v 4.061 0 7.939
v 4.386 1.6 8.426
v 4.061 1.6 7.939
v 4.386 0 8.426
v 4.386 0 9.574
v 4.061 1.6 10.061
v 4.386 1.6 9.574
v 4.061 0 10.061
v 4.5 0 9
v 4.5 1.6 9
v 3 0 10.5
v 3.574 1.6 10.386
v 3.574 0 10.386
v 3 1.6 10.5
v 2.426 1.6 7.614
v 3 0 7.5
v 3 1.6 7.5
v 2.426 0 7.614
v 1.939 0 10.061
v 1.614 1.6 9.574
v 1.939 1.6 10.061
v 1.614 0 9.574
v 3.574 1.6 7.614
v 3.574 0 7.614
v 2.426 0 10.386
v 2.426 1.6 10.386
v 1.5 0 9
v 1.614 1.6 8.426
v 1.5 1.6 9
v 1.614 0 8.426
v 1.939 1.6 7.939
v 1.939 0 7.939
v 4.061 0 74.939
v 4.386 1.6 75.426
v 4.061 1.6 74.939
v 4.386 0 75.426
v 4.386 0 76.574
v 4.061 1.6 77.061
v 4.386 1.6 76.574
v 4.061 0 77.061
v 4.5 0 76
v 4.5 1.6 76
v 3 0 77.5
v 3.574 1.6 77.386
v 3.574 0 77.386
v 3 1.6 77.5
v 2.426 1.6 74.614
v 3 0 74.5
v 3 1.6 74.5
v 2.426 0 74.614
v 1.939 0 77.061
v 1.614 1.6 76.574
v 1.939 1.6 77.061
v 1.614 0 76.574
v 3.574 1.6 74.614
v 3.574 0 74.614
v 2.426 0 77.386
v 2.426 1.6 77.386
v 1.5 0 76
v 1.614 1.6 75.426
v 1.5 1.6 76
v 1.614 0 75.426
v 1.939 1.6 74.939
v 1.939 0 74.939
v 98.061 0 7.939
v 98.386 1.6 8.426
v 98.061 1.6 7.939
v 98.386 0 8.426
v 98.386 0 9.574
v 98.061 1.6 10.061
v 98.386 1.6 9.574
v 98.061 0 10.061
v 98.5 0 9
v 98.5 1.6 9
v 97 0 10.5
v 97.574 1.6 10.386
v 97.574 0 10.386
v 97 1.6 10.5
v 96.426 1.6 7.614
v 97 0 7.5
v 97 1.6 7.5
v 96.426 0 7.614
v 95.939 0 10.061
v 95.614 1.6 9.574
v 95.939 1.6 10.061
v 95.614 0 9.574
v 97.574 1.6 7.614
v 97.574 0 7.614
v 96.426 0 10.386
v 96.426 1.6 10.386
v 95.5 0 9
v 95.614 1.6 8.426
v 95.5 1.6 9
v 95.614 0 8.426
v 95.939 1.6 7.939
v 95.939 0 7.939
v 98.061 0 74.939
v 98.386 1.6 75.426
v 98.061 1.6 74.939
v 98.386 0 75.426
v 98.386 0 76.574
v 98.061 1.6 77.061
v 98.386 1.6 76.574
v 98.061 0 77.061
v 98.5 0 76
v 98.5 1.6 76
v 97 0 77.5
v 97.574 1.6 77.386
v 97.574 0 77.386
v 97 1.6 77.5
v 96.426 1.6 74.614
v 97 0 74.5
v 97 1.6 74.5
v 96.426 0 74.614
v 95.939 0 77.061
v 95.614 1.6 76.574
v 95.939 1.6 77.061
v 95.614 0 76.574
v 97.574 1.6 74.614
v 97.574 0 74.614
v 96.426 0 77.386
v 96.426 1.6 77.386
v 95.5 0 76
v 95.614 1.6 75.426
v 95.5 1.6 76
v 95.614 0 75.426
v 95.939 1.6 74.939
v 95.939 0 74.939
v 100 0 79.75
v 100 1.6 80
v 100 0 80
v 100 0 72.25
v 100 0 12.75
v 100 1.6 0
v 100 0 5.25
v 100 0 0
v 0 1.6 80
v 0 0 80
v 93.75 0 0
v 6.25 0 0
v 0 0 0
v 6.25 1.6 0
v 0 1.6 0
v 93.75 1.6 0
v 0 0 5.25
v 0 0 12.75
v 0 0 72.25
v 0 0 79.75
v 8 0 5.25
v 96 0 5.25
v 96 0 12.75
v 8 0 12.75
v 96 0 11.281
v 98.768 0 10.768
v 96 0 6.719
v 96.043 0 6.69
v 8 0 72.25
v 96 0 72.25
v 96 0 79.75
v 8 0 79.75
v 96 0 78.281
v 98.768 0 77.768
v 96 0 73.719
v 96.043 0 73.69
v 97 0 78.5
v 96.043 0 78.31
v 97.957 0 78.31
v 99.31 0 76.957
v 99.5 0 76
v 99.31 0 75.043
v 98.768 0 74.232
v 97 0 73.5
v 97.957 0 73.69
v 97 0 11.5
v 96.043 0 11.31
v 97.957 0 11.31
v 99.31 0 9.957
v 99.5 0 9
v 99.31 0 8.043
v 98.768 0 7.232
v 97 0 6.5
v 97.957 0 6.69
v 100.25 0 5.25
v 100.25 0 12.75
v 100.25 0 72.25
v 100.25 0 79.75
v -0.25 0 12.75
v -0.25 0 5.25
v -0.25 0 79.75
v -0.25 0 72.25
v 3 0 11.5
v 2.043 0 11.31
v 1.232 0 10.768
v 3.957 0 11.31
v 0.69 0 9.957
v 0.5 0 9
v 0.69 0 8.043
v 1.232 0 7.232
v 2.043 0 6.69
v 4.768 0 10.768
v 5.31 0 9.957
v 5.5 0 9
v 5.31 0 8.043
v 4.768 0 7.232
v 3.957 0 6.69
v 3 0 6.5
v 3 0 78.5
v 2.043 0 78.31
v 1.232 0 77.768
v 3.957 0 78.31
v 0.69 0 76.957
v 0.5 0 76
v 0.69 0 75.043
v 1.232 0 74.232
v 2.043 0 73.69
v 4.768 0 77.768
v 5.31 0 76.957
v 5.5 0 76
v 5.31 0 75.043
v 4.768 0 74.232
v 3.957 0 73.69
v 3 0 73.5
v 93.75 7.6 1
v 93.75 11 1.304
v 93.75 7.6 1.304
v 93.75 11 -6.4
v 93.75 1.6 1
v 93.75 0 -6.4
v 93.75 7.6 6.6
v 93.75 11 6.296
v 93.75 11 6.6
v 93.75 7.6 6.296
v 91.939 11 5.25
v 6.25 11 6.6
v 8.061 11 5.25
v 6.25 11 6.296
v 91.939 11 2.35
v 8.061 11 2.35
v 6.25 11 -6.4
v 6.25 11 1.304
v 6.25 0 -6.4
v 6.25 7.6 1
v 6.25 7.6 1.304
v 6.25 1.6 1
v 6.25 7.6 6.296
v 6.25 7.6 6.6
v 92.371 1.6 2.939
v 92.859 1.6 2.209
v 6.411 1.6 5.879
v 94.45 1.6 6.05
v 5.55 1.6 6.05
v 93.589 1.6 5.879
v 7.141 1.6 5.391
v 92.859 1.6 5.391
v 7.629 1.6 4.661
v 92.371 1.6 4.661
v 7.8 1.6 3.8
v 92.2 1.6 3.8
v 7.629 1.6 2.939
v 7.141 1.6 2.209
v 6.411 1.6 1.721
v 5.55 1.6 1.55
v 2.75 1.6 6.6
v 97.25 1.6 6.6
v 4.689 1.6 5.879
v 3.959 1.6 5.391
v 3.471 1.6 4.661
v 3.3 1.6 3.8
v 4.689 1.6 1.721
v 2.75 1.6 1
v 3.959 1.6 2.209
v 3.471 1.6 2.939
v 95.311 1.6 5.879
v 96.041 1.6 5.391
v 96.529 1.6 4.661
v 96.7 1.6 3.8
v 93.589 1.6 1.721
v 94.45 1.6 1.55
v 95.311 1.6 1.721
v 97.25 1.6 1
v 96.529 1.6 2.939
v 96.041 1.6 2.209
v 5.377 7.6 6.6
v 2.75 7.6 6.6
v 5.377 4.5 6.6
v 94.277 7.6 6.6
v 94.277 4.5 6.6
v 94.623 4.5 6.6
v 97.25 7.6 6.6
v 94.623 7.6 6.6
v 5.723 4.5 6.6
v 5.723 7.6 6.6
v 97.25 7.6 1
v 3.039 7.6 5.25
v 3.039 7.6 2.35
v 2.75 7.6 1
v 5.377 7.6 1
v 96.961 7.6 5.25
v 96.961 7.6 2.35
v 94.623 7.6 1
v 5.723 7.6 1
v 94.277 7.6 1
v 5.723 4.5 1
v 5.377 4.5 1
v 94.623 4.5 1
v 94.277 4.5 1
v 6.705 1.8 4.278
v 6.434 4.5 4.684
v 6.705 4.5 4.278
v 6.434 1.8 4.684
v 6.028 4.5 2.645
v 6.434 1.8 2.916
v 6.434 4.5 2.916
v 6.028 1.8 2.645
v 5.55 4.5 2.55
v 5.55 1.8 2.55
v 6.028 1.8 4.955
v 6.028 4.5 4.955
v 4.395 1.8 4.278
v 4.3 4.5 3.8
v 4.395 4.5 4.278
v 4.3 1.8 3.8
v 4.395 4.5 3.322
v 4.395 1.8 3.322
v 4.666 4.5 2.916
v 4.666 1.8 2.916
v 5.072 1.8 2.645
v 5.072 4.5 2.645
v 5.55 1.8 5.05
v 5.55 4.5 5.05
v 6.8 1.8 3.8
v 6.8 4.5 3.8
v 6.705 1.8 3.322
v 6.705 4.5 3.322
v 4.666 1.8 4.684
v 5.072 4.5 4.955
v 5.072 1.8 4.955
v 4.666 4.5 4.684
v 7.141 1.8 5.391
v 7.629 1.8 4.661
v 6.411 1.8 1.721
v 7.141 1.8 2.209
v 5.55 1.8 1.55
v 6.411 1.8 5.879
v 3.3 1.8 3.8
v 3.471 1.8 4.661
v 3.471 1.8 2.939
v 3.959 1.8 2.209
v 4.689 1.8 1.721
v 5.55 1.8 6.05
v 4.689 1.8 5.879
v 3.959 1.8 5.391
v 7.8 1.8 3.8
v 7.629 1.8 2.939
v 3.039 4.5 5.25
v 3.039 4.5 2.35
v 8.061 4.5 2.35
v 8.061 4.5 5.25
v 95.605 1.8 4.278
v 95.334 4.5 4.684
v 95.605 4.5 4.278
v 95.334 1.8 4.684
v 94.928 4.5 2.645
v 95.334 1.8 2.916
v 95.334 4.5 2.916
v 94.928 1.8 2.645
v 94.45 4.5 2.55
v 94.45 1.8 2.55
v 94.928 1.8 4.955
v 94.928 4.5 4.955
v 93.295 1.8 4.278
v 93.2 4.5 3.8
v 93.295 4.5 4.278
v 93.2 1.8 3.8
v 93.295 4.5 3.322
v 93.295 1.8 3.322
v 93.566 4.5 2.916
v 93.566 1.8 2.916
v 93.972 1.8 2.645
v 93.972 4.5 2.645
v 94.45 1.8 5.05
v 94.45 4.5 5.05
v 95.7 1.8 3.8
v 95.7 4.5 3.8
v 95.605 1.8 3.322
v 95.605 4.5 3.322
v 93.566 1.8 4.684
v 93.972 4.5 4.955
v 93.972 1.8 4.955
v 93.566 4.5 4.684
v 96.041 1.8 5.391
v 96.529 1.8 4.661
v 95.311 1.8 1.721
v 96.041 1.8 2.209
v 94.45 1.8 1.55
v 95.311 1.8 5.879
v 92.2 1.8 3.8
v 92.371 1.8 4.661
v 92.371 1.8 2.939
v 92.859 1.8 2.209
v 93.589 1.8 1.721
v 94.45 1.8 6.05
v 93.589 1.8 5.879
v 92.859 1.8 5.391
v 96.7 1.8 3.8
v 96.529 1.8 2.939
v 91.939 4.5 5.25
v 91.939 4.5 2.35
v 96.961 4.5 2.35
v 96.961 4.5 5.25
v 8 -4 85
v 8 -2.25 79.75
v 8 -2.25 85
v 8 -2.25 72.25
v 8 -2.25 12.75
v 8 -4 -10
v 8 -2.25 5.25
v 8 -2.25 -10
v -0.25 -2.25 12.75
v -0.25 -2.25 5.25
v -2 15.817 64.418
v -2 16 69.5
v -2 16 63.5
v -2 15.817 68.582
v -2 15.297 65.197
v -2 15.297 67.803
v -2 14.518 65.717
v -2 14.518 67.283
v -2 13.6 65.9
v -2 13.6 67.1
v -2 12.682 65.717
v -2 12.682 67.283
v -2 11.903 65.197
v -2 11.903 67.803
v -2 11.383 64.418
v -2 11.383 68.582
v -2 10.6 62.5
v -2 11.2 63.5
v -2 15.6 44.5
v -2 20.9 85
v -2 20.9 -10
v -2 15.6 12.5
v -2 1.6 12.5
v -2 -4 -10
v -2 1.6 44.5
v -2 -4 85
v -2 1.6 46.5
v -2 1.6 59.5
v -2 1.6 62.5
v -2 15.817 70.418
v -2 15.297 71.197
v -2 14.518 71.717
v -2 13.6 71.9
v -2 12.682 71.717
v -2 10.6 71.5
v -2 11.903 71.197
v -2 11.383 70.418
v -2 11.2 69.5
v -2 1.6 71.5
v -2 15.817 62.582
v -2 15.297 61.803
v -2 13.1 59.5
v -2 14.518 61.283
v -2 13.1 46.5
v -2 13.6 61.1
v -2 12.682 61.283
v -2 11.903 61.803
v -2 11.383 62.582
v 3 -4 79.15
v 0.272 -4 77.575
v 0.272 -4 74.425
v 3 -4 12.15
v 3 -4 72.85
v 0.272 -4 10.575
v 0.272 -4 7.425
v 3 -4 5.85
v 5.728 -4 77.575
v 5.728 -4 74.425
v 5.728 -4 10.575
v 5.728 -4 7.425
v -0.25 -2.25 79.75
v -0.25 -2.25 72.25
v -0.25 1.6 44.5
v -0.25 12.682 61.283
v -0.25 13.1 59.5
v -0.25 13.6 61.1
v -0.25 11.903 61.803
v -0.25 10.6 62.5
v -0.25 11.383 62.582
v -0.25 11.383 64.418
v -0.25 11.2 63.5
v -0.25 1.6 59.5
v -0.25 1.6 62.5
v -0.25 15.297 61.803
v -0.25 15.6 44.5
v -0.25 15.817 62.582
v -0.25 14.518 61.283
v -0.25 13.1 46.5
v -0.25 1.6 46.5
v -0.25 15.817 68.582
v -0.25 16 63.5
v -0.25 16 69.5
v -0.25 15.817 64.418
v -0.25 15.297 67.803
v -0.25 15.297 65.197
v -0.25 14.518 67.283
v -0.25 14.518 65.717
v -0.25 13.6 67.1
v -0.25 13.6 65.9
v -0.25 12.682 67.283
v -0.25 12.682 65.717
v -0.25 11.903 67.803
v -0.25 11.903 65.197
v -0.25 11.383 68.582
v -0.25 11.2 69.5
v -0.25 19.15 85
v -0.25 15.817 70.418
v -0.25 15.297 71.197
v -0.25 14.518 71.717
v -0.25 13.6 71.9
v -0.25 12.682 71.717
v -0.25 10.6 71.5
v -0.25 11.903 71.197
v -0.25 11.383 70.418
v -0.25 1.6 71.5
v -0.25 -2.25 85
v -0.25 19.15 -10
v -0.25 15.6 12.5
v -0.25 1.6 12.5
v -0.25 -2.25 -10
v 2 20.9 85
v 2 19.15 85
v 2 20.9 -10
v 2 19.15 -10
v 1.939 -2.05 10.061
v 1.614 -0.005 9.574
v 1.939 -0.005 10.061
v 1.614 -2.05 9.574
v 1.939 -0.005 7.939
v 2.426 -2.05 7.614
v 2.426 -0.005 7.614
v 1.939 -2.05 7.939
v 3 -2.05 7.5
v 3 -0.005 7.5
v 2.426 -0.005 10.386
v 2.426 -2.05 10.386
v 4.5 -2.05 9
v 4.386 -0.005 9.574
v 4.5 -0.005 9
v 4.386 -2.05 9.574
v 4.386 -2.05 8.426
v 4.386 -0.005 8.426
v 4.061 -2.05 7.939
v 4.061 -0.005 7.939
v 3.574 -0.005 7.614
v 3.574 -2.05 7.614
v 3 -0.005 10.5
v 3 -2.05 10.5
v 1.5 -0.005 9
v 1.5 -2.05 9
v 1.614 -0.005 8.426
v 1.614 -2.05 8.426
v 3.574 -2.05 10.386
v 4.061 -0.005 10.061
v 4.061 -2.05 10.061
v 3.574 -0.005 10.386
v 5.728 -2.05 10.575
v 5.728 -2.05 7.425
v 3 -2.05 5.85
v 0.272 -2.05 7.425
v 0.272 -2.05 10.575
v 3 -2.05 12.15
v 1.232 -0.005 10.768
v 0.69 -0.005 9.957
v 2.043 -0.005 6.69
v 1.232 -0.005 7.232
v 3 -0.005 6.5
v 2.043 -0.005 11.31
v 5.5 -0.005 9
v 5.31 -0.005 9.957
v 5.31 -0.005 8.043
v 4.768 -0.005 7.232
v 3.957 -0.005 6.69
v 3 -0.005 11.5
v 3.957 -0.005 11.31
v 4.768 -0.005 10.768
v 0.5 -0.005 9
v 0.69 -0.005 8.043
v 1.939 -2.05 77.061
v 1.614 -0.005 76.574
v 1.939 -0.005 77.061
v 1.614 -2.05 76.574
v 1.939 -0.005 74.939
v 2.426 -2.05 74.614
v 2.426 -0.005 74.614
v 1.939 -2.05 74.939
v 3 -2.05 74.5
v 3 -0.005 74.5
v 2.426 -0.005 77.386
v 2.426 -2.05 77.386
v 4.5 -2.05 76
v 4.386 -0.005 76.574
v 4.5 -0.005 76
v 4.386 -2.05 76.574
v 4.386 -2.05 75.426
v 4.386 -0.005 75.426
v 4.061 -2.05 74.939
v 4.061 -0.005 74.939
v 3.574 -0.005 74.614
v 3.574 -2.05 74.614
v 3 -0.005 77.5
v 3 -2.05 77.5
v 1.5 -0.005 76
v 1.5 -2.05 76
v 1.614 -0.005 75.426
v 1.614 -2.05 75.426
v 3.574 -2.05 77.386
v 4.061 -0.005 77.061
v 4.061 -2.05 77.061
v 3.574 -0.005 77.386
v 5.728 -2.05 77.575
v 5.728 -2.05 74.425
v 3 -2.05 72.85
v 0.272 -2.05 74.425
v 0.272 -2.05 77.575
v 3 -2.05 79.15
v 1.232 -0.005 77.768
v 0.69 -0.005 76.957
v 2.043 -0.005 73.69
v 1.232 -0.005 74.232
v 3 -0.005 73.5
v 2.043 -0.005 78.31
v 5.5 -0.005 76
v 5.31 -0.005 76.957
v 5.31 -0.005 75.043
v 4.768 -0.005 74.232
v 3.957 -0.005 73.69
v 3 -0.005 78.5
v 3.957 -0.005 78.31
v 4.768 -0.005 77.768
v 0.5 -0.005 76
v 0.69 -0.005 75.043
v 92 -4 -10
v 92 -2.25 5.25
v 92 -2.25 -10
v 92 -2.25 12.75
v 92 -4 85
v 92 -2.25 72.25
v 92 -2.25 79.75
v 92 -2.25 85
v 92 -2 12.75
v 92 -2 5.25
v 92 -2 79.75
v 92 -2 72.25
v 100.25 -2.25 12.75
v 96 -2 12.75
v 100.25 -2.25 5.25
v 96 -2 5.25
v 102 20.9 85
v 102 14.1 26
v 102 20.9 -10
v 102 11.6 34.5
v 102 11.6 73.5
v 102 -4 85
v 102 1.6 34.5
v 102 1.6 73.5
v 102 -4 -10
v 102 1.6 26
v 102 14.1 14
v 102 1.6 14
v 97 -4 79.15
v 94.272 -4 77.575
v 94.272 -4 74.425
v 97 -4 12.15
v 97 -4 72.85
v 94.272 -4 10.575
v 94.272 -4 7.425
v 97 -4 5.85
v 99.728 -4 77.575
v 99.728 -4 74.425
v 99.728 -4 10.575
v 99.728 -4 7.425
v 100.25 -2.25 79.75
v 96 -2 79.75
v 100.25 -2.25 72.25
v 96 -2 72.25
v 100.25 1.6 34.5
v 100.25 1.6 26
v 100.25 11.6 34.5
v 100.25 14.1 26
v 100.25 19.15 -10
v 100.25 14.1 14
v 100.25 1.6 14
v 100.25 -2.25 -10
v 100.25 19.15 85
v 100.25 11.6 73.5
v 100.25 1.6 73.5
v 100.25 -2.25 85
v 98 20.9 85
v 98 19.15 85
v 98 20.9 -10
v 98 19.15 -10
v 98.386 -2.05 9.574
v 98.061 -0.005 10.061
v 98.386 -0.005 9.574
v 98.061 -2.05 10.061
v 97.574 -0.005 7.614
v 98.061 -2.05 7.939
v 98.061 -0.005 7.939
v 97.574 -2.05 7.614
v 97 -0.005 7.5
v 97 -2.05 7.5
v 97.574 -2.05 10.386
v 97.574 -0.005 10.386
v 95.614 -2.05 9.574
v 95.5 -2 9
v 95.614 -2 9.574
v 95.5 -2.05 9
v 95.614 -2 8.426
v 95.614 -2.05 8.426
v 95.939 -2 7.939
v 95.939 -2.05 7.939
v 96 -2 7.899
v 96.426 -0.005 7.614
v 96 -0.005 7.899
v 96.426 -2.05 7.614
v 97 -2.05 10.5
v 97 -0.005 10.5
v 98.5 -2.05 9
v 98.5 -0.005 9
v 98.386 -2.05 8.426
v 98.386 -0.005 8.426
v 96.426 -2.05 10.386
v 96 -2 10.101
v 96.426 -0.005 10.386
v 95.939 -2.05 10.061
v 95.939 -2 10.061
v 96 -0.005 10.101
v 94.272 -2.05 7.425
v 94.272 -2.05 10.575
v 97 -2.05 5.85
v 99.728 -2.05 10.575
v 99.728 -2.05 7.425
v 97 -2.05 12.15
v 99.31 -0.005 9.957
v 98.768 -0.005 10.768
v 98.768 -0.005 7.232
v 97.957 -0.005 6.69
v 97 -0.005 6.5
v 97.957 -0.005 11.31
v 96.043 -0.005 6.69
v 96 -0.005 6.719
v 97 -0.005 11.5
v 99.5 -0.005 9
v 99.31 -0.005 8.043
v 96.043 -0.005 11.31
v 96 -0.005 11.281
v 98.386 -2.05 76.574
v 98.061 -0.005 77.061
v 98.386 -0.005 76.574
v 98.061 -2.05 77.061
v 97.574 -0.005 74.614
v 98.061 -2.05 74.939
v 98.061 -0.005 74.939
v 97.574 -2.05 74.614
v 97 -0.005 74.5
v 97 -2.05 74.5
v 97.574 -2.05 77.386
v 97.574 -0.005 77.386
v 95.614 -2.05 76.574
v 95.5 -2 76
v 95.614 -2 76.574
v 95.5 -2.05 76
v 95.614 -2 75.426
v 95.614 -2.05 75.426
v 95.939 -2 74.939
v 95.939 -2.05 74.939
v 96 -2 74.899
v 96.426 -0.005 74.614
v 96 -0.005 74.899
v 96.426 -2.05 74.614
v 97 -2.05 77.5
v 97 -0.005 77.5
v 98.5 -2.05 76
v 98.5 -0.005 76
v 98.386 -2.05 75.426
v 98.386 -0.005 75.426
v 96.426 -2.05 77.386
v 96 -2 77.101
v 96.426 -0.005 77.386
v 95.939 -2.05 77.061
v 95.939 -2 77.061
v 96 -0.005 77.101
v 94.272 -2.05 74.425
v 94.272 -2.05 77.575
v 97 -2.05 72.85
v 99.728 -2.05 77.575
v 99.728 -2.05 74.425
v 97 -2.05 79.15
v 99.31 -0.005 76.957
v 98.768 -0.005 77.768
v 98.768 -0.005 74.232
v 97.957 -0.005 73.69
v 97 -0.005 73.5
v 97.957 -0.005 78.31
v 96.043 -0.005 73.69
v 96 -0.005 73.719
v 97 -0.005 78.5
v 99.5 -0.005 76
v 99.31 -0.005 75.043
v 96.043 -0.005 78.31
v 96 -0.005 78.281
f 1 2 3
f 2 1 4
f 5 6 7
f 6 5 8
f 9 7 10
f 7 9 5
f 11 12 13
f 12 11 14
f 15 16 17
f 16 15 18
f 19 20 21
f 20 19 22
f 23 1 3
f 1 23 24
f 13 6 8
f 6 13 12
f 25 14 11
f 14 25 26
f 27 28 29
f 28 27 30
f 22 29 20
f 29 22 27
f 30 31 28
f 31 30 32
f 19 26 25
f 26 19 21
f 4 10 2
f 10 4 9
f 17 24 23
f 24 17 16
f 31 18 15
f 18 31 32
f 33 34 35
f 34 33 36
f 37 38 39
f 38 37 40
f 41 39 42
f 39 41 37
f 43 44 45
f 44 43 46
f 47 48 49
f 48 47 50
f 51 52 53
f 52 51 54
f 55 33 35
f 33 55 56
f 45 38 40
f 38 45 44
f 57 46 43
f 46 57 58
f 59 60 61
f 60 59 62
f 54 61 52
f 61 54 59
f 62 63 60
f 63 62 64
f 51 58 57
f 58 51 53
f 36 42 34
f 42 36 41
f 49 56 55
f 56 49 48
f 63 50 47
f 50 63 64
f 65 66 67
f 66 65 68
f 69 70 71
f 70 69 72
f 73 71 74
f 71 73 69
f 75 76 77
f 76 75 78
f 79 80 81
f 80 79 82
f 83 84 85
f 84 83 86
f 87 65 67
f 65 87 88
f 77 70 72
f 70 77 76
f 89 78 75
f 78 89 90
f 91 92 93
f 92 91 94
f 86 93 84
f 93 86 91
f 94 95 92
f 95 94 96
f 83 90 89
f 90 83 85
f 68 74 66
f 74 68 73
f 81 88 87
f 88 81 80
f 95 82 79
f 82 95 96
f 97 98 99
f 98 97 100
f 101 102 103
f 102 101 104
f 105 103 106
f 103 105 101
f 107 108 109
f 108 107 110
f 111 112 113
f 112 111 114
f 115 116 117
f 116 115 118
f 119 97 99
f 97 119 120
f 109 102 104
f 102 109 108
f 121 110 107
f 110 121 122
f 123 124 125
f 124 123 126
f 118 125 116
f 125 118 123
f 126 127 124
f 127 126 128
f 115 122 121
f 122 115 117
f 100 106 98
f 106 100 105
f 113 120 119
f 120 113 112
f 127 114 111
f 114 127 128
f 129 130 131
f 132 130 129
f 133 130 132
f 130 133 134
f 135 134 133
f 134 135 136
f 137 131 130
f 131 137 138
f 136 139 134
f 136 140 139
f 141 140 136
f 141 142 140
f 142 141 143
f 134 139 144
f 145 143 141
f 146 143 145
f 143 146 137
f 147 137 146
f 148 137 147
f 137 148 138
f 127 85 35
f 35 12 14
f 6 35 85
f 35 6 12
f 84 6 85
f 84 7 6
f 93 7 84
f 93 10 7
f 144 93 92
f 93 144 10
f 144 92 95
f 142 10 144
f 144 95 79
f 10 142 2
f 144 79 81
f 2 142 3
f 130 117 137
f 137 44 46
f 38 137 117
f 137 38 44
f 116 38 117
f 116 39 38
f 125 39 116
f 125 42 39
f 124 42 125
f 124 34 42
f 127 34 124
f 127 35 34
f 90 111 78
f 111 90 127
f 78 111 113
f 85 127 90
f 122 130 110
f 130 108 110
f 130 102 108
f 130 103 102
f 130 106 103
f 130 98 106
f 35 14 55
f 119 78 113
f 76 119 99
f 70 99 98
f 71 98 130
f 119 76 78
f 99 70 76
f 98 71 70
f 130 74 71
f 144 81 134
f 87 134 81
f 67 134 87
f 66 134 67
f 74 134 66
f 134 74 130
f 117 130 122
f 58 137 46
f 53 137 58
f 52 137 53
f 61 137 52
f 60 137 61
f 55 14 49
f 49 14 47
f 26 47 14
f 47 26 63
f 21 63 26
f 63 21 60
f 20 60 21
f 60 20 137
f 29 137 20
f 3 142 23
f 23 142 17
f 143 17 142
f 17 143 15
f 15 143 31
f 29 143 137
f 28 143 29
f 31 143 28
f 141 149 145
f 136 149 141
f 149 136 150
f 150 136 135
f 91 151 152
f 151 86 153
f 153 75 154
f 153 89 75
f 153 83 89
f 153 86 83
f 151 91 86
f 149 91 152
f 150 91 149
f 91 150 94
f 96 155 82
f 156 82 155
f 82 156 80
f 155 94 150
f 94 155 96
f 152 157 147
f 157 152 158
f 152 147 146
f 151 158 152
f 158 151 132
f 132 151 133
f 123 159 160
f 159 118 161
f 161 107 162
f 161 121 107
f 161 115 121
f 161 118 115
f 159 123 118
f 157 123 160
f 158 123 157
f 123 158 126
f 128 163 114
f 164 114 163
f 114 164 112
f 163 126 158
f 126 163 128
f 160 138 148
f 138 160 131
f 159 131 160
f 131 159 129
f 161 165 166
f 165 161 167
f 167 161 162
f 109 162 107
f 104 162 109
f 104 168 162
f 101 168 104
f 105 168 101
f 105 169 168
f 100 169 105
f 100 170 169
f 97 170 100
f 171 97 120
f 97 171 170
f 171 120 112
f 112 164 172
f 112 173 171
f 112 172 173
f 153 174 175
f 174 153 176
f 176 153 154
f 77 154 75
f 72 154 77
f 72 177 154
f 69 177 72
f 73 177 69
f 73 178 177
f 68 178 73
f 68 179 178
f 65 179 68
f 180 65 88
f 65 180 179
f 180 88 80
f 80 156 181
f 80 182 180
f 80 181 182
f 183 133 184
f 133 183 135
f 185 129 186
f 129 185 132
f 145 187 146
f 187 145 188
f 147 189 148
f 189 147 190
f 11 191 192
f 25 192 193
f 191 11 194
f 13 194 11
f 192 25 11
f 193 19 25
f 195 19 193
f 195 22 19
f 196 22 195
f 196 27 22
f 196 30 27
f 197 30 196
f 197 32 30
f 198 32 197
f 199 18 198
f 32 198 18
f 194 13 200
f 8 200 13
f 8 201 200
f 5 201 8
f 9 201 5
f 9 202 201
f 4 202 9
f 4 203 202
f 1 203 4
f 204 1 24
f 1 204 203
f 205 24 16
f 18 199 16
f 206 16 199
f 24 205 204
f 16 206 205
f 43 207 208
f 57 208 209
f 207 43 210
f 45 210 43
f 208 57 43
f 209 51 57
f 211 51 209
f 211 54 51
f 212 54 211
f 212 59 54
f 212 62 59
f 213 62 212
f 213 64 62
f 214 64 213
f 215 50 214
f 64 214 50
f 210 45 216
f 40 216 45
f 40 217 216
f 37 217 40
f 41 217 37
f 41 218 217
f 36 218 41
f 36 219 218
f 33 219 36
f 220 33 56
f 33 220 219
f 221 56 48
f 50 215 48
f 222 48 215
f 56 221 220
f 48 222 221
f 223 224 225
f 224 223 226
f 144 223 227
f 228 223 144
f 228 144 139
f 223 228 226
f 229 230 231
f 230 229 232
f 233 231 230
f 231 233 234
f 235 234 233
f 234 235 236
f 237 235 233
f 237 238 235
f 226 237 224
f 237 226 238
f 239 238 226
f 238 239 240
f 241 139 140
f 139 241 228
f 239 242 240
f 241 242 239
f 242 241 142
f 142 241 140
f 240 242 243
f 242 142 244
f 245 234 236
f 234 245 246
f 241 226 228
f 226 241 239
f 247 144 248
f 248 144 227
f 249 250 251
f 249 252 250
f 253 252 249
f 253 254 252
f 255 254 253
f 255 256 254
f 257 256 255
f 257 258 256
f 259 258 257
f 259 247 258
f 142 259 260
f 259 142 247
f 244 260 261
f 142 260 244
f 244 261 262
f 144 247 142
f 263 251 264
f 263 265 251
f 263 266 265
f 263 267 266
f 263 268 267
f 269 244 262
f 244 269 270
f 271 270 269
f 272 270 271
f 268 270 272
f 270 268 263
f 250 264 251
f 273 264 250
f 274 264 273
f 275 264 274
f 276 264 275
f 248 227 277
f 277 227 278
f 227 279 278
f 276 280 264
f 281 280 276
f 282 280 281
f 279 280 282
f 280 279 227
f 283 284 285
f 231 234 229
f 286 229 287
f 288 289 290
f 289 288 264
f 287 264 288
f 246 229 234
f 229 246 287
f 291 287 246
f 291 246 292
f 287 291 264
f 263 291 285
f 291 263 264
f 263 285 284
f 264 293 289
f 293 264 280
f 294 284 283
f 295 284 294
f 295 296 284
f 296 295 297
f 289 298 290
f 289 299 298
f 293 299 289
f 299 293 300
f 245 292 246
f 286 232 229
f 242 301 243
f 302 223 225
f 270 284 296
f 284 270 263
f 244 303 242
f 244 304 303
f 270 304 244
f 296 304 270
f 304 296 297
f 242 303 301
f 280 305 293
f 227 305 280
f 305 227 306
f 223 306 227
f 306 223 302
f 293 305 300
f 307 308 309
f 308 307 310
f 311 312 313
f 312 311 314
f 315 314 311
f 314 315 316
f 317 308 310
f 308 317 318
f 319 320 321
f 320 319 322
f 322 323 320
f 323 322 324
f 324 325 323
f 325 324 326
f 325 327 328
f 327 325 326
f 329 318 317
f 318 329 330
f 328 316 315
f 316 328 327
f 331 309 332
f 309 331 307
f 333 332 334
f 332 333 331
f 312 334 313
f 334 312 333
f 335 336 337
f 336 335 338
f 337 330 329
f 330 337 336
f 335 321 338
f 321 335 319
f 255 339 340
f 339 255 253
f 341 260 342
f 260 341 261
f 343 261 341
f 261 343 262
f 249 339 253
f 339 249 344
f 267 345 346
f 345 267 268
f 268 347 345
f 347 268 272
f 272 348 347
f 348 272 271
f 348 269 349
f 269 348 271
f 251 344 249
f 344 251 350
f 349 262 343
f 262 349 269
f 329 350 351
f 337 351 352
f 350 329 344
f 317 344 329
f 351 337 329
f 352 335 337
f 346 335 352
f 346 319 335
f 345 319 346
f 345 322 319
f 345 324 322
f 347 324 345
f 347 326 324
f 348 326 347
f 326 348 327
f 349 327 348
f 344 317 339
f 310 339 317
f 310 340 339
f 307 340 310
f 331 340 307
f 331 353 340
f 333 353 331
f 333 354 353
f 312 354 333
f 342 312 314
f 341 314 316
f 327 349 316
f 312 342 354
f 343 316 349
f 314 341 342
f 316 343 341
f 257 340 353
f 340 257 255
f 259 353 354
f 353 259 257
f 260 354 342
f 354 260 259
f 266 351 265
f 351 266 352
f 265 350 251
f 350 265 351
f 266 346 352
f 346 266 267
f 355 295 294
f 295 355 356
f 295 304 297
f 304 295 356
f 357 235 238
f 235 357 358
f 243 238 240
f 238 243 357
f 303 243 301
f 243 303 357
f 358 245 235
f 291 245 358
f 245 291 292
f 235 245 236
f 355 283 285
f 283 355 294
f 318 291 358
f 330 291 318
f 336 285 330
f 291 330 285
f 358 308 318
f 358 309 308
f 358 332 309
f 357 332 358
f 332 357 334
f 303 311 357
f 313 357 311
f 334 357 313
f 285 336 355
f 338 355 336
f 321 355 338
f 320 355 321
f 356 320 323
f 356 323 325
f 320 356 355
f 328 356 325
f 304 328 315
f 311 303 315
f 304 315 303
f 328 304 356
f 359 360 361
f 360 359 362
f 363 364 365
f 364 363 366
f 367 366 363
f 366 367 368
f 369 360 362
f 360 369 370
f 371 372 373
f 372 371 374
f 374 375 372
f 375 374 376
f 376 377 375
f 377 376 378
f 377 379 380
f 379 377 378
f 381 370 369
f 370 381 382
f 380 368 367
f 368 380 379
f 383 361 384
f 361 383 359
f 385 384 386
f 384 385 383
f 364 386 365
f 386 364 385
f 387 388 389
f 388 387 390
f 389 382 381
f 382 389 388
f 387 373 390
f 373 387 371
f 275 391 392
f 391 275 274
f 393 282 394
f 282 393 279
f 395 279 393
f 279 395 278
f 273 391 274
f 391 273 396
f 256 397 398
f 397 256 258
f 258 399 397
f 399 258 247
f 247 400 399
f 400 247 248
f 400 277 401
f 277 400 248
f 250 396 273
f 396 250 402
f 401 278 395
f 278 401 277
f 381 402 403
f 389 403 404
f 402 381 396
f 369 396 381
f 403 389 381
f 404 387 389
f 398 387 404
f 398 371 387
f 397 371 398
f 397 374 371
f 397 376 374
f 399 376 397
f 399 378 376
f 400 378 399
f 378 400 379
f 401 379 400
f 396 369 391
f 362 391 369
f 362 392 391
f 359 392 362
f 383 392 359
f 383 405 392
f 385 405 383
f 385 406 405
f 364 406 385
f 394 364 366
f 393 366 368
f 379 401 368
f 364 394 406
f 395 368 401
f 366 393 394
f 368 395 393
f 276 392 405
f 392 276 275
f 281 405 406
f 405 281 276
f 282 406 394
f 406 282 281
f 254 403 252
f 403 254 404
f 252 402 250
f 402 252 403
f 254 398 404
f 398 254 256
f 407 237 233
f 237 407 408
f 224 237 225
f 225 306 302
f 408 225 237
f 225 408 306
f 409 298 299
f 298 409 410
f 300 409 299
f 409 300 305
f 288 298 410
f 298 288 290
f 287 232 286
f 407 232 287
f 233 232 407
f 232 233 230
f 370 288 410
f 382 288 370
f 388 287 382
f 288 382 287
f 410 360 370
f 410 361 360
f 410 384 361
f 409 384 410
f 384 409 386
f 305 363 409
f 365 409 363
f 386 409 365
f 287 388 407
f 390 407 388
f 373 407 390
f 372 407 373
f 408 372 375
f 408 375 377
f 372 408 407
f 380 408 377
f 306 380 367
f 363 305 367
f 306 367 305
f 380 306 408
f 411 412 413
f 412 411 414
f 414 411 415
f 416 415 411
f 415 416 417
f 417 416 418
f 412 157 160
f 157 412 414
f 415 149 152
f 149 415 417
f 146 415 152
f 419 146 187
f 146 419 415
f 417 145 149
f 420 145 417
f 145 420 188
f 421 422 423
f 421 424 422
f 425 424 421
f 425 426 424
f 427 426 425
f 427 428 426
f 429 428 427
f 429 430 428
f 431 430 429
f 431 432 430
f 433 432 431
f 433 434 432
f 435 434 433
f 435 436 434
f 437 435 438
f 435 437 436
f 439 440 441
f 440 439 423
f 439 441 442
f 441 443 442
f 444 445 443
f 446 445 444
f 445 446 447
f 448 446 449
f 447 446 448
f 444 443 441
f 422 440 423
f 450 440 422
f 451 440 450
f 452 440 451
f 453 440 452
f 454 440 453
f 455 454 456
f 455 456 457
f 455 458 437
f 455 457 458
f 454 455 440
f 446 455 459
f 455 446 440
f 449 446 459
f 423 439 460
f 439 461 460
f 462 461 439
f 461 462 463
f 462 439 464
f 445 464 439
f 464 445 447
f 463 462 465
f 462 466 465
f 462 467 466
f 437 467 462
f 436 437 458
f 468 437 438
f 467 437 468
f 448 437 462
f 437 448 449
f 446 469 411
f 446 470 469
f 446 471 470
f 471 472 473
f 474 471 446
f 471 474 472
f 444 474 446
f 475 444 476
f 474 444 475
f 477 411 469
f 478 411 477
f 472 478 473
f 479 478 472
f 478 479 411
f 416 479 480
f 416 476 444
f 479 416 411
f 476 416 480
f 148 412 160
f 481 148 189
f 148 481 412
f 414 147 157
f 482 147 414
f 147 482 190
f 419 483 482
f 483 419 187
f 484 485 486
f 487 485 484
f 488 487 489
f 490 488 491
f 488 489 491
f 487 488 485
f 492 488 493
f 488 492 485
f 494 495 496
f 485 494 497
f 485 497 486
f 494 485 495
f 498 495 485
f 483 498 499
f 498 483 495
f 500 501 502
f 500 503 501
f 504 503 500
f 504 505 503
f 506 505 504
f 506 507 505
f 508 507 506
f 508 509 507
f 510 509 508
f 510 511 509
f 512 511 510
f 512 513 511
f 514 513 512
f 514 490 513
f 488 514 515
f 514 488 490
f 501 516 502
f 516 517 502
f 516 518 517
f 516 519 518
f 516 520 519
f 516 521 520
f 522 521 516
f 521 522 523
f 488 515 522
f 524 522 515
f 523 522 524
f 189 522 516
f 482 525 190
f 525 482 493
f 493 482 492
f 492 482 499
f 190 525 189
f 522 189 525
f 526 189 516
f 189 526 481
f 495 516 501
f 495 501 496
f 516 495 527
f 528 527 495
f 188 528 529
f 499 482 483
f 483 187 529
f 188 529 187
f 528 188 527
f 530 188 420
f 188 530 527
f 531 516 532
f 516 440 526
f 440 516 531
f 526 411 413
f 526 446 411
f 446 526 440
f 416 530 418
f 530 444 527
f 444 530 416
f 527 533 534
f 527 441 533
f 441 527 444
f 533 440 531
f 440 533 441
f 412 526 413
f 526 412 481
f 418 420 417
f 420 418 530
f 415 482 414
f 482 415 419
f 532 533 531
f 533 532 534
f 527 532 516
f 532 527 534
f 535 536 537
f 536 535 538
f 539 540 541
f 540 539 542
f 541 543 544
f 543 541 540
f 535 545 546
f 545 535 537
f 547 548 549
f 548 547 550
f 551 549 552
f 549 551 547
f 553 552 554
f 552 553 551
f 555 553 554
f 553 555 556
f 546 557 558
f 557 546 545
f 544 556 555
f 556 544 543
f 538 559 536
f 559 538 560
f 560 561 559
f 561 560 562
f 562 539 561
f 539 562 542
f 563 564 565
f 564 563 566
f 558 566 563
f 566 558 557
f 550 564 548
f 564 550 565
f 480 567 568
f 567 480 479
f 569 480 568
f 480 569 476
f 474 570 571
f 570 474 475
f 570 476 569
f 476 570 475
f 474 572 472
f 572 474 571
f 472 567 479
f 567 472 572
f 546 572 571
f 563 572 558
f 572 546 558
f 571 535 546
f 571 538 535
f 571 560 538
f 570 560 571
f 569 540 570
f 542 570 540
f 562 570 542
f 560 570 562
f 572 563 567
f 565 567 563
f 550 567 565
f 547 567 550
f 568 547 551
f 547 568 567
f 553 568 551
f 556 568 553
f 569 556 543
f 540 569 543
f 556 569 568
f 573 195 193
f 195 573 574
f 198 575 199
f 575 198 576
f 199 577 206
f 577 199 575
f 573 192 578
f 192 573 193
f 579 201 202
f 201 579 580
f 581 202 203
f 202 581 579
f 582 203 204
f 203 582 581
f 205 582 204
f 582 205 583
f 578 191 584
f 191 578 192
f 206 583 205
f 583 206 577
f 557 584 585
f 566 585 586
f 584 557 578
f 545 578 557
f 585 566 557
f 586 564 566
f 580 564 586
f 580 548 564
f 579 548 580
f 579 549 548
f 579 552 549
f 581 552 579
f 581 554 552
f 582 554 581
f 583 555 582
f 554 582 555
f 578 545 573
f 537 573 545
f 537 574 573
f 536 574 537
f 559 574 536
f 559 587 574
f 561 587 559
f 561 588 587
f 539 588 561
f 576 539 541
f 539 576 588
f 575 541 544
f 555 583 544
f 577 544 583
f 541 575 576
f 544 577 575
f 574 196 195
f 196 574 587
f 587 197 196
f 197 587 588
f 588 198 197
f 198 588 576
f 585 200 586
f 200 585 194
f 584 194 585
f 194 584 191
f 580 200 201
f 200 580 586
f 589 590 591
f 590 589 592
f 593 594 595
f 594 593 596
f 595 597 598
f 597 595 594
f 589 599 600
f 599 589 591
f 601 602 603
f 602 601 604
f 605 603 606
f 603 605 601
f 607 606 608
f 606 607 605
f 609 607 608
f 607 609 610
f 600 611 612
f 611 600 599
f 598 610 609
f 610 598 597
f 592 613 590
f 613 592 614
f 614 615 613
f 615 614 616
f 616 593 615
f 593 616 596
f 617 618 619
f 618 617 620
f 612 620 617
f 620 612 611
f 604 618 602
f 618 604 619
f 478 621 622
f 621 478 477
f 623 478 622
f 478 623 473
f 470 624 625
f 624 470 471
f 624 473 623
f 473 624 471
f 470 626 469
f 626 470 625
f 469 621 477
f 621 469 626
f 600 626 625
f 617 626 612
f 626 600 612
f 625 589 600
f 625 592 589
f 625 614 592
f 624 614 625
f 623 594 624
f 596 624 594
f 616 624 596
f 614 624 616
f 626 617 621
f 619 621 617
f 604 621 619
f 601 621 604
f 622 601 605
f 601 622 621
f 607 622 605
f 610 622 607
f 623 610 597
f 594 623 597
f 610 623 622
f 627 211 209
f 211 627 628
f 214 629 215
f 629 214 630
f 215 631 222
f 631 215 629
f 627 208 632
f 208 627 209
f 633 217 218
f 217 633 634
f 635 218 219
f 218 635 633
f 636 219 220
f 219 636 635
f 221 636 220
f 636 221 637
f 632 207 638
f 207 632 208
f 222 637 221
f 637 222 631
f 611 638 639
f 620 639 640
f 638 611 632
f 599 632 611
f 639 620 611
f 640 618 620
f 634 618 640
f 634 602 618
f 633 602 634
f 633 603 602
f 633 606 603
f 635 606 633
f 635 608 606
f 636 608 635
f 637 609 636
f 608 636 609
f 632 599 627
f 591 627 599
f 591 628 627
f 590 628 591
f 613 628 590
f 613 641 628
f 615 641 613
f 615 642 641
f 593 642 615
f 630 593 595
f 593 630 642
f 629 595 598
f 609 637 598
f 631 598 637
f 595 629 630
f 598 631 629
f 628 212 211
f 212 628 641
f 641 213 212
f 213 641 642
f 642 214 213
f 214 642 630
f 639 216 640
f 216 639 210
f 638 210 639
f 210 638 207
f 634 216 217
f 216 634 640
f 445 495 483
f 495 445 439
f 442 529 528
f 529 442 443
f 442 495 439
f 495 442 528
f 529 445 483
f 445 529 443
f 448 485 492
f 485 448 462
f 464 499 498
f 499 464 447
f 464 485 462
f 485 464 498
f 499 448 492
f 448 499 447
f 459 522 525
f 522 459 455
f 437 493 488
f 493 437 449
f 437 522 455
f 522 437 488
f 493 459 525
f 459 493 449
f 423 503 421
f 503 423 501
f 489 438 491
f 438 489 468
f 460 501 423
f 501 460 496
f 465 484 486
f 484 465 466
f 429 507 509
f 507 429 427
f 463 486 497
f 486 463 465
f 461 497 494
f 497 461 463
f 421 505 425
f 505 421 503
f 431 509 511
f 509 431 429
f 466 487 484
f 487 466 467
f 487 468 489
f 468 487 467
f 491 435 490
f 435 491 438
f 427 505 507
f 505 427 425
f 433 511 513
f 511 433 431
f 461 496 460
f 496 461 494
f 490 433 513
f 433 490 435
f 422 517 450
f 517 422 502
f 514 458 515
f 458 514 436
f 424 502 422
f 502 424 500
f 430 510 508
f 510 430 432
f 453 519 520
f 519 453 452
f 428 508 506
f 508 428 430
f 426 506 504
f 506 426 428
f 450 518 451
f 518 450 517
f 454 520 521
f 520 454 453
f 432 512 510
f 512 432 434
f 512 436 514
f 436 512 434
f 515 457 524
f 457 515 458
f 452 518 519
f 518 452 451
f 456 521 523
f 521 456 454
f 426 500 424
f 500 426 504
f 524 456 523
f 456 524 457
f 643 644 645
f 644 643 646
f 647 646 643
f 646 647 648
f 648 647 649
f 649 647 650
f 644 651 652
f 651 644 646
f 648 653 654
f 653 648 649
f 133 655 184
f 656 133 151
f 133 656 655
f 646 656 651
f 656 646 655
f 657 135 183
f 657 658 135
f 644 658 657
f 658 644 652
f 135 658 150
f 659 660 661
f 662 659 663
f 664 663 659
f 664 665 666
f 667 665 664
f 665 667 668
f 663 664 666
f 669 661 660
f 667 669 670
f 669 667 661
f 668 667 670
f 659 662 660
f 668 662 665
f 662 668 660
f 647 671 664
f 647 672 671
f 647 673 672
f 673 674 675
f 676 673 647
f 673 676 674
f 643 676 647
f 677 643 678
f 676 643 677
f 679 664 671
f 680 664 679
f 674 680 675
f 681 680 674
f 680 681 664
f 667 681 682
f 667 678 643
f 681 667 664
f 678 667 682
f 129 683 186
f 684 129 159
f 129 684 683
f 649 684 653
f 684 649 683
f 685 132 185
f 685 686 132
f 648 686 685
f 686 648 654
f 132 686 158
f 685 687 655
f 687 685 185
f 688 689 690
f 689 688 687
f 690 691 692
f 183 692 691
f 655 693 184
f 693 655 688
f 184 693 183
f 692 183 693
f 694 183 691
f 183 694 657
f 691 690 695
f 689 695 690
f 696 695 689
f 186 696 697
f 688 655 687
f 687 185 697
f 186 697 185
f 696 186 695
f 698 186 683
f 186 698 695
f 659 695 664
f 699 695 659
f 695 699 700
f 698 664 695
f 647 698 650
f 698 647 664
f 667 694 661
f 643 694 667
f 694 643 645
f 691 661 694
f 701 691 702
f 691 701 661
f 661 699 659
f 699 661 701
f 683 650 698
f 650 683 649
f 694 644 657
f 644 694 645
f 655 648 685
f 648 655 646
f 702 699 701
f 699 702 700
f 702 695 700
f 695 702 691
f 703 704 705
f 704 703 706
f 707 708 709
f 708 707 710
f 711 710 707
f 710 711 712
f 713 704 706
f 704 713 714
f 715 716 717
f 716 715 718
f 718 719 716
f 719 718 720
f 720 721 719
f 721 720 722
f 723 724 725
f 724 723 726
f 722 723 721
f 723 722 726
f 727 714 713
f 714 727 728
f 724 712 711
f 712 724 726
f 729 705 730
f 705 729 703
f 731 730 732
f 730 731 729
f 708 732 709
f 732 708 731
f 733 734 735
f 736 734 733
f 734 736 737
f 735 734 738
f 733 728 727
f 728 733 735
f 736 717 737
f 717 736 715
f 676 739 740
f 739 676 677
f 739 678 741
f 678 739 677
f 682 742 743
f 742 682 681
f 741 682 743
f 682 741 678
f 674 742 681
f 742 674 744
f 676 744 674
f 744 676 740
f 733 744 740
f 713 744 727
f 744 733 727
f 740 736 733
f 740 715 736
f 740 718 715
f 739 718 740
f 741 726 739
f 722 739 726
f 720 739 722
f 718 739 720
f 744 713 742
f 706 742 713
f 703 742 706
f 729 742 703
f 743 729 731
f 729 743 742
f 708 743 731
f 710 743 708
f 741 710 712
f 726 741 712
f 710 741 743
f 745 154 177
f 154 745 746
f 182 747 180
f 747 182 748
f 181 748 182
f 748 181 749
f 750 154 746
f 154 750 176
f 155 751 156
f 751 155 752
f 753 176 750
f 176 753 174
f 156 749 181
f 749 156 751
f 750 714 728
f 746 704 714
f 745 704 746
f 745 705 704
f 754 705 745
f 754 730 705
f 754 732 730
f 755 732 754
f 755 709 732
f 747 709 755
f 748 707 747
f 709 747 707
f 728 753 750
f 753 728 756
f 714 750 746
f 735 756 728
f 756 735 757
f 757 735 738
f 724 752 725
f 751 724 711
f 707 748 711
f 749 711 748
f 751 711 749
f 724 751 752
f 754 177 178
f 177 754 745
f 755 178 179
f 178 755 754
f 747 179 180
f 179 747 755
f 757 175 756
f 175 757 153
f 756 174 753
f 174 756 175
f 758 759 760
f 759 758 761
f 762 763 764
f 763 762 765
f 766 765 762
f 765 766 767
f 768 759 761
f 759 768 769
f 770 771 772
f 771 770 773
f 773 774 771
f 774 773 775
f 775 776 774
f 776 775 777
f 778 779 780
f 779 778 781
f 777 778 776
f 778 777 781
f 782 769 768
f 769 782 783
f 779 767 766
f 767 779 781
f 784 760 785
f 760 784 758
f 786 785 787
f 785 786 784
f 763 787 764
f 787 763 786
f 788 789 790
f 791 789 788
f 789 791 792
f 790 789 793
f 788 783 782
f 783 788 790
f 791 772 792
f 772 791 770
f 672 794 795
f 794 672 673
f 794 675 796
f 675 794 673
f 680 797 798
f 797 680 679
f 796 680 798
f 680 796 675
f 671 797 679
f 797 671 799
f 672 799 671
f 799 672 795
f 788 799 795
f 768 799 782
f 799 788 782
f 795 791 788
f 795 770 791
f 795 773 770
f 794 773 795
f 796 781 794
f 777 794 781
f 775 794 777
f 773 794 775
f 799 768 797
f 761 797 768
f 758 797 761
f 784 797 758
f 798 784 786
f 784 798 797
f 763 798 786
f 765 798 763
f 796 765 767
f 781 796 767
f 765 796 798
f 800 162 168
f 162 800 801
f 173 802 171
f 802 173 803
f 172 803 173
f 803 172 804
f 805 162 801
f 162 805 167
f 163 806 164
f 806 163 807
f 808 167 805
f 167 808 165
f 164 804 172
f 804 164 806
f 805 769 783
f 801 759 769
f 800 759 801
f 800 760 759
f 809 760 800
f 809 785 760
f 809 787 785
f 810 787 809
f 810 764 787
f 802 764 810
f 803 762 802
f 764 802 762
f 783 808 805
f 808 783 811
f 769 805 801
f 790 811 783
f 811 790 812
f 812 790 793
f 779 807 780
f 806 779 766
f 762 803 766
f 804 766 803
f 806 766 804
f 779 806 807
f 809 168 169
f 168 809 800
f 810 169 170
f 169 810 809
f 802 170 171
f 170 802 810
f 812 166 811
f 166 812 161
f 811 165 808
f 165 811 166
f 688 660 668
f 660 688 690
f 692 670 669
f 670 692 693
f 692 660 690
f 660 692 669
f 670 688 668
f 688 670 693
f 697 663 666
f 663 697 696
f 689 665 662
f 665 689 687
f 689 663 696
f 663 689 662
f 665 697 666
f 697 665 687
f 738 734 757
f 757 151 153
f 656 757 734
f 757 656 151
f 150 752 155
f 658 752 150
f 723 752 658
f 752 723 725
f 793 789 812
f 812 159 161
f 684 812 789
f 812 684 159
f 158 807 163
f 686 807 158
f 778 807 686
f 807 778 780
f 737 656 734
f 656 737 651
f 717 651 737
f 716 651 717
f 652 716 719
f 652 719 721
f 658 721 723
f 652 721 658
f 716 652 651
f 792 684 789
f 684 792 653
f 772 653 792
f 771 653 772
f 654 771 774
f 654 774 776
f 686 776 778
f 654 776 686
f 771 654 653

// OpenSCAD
// file: ../library/din41612/din41612_male.scad
// din41612 male connector
// =======================

include <din41612_male_dim.scad>

use <../linurs/linurs_screw.scad>

module din41612_male(){ 
  // color("LightGrey")
  difference(){
    union(){
        translate([0,din41612_male_w1/2,din41612_male_h/2-din41612_male_h1])  
        cube([din41612_male_l1,
              din41612_male_w1,
              din41612_male_h],
             center=true);  
      translate([0,(din41612_male_w1-din41612_male_w)/2,(din41612_male_h-din41612_male_h1)/2]) 
        cube([din41612_male_l1,
              (din41612_male_w-din41612_male_w1),
              din41612_male_h-din41612_male_h1],
             center=true);  
      translate([0,din41612_male_w2/2+din41612_male_w1-din41612_male_w,din41612_male_h2/2])
        cube([din41612_male_l,
              din41612_male_w2,
              din41612_male_h2],
             center=true);  
    }
    for(i=[-1,1]){ // mounting holes
      translate([i*din41612_male_dl/2,
                 din41612_male_w1-din41612_male_w+din41612_male_w2/2, 
                 din41612_male_h1])
      rotate([180,0,90])screw_fix(
            w=din41612_male_h2, 
            d=M2_5, 
            type=head_cyl, 
            nut_sink=din41612_male_h,
            t=0);
    }
  }
}
din41612_male();  
// file: ../library/din41612/din41612_male_dim.scad
include <../linurs/linurs_screw_dim.scad>

// connector dimensions
din41612_male_l=94.5;    // lenght of the connector
din41612_male_l1=87.5;   // 
din41612_male_w=13;      // width of the connector
din41612_male_w1=6.4;    // 
din41612_male_w2=5.6;    // 
din41612_male_h=11;      // height of the connector
din41612_male_h1=1.6;    // 
din41612_male_h2=6;      // 

din41612_male_dl=88.9;   // distance between mounting holes
// file: ../library/din41612/din41612_female_dim.scad
include <../linurs/linurs_screw_dim.scad>

// connector dimensions
din41612_female_l=95;       // lenght of the connector
din41612_female_l1=85;      // lenght of the connector head
din41612_female_h=11.6;     // height of the connector
din41612_female_h1=5.2;     // height produced by the connector when pulgged in 
din41612_female_w=11;       // width of the connector
din41612_female_w1=8.5;     // width of the connector head

din41612_female_dl=90;      // distance between mounting holes
// file: ../pcb/pcb.scad
// pcb
// ===
// The pcb is the master object and has its 
// lower left corner solder side at the origin of the 
// coordinate system 

n=2;  // [1,2,3,4,5,6,7,8]
show_pcb="assemblies"; // [assemblies,assembly,pcb]

include <pcb_dim.scad>
include <../motherboard/motherboard_dim.scad>

use <../library/din41612/din41612_male.scad>

module pcb(){
  echo("pcb");  
  color("greenyellow")
  difference(){
    cube([pcb_l,pcb_h,pcb_w]); // pcb
    for(x=[-1,1]){ // mounting holes
      for(y=[pcb_wd1,pcb_wd1+pcb_wd]){
        translate([x*pcb_ld/2+pcb_l/2,0,y])
        rotate([90,0,0])
        cylinder(d=pcb_d,h=3*pcb_h,center=true,$fn=16);
      }
    }
  }
}

module pcb_assembly(){
  echo("pcb assembly");  
  pcb();  
  translate([pcb_l/2,pcb_h,0])  
  rotate([-90,0,0])din41612_male();  
}

module pcb_assemblies(n=1){
  echo("pcb assemblies"); 
  for(i=[0:n-1]){ // add the connectors
      echo(i);
      translate([0,step*i,0])
      pcb_assembly();
  }    
}    

if(show_pcb=="assemblies"){
  pcb_assemblies(n=n);
}

if(show_pcb=="assembly"){
  pcb_assembly();
}

if(show_pcb=="pcb"){
    // Move to center to create 2D drawings from top view 
    // with script OpenSCAD22d.py
    //
    rotate([90,0,180])
    //
    translate([-pcb_l/2,-pcb_h/2,-pcb_w/2])
    pcb();
}
// file: ../bracket/bracket.scad
// bracket
// =======
// A bracket of the elecbox module
// - type: 0 front bracket, 1 rear bracket
// - width 1..n in steps

// parameters for customizer
// bracket width
n=2; // [1,2,3,4,5,6,7,8]
// type
bracket="Front"; // [Front,Back]
// intermediate mounting holes
intermediate=false;  

include <../pcb/pcb_dim.scad>

include <../motherboard/motherboard_dim.scad>
include <../library/linurs/linurs_screw_dim.scad>
include <bracket_dim.scad>

use <../library/linurs/linurs_screw.scad>
    
module back_bracket(n=1, intermediate=false){
  mirror([1,0,0])       // mirror it if desired
  front_bracket(n=n, intermediate=intermediate); 
}
    
module front_bracket(n=1, intermediate=false){
  echo("bracket");  
  //color("White")
  intermediatestep=(intermediate)?step:0; 
  difference(){
    union(){
      translate([-bracket_h2/2-bracket_gap/2,
                 bracket_w(n)/2-bracket_w1,
                 bracket_l/2])  
      cube([bracket_h2,
            bracket_w(n),
            bracket_l],center=true); // create the bracket front
  
      translate([bracket_h/2-bracket_h2-bracket_gap/2,
                 bracket_t/2-bracket_w1,
                 bracket_l/2]) 
      cube([bracket_h,
            bracket_t,
            bracket_l],center=true); // U shape side of the screw
      
      translate([bracket_h1/2-bracket_h2-bracket_gap/2,
                 bracket_w(n)-bracket_w1-bracket_t/2,
                 bracket_l/2]) 
      cube([bracket_h1,
            bracket_t,
            bracket_l],center=true); // U shape where no screw  
      for(x=[1:n]){  // create the mounting hole cubes 
        for(z=[bracket_l1,
               bracket_l1+bracket_ld]){
          translate([ bracket_h/2-bracket_h2-bracket_gap/2,
                     -bracket_w1/2+(x-1)*intermediatestep,
                     z])
          cube([bracket_h,
                bracket_w1,
                bracket_l2],center=true);
        }
      }   
    }
    for(x=[1:n]){ // create the mounting hole 
      for(z=[bracket_l1,
             bracket_l1+bracket_ld]){
        translate([bracket_h3-bracket_h2-bracket_gap/2,
                  -bracket_w1/2+(x-1)*intermediatestep,
                   z])
        rotate([0,90,0])
        rotate([-90,0,0])
        screw_fix(w=bracket_w1,d=bracket_screw,type=head_no, t=bracket_screw_gap);
      }
    }
  }
}

if(bracket=="Front"){
  front_bracket(intermediate=intermediate,n=n);
}

if(bracket=="Back"){
  back_bracket(intermediate=intermediate,n=n);
}
// file: ../library/linurs/linurs_screw.scad
// Metric screws and nuts 
// urs@linurs.org 2019
// It is targeted for 3D printing applications. 
// To look realistic is not the goal (Example: Nuts do not have a hole)

include <linurs_screw_dim.scad>

d=0; //[0:M2_5,1:M3,2:M4,3:M5]
type=0;//[0:head_cyl,1:head_cnt,2:head_no,3:head_hex]
w=15; 
i=10;
nut_sink=0;
screw_sink=0; 
t=0.01;
fn=16;

/* [hex_bolt] */
show_hex_bolt=false;

/* [nut] */
show_nut=false;

/* [screw] */
show_screw=false;

/* [screw_fix] */
show_screw_fix=false;

/* [screw_cut] */
show_screw_cut=false;

/* [nut_cut] */
show_nut_cut=false;
wi=0; 
rot=false;

// functions used multiple times to position nuts and heads
function headh_cyl(d)=screw_cyl[d][1];  // height of cyl screw head
function headh_cnt(d)=screw_cyl[d][1];  // height of cnt screw head
function headh(d,type=head_cyl)=(type==head_cyl ? headh_cyl(d) : (type==head_cnt ? headh_cnt(d) : 0 )); // height of screw head 

function nuth(d)=screw_hex[d][2];   // height of hex nut

// head of a cylinder screw
module screw_head_cyl(d=M3, t=0)
{
  screwhd=screw_cyl[d][0]+t; // diameter of cylinder screw head
  cylinder(d=screwhd,h=headh(d=d, type=head_cyl), center=true,$fn=16); // screw head
}

// head of a countersunk screw
module screw_head_cnt(d=M3, t=0)
{
  screwd=screw_d[d]+t; 
  screwhd=screw_cnt[d][0]+t; // diameter of cylinder screw head
  cylinder(d1=screwd,d2=screwhd,h=headh(d=d,type=head_cnt), center=true,$fn=16); // screw head
}

// head of a hex screw
module screw_head_hex(d=M3, t=0)
{
    translate([0,0,-nuth(d)/2])nut(d=d, t=t);
}

// head of all screws
module screw_head(d=M3, type=head_cyl, t=0)
{ 
  if(type==head_cnt){
    screw_head_cnt(d=d, t=t);
  } else {
    if(type==head_cyl){
      screw_head_cyl(d=d, t=t);
    } else {
       if(type==head_hex){
           screw_head_hex(d=d, t=t); 
       } 
    }    
  }
}

// hex bolt 
module hex_bolt(d=M3, w=10, t=0)
{
  nutd=screw_hex[d][1]+t; // outer diameter of hex bolt
  cylinder(r=nutd/2,h=w+t, center=true,$fn=6); // nut
}

// nut 
module nut(d=M3, t=0)
{
  hex_bolt(d=d, w=nuth(d), t=t);    
}

// screw 
// w outer width of the screw = screw length + head 
module screw(w=10, d=M3, type=head_cyl, t=0){
  screwd=screw_d[d]+t;       // screw diameter
  cylinder(d=screwd, h=w, center=true,$fn=16); // screw thread length
  translate([0,0,w/2-headh(d=d,type=type)/2])
  screw_head(d=d,type=type, t=t);
}

// screw fix
// w outer width of the screw = screw length + head 
// sink additional material below to remove 
// raise additional material above to remove
module screw_fix(w=10, d=M3, type=head_cyl, screw_sink=0, nut_sink=0, t=0){
  screw(w=w, d=d, type=type, t=t);
  translate([0,0,-w/2+nuth(d)/2])
    nut(d=d,t=t);
  //additional material to be removed above the nut  
  translate([0,0,-(w+nut_sink)/2])hex_bolt(d=d,w=nut_sink+0.01,t=t);    
  //additional material to be removed above the screw head
  if(type==head_cnt){  
    translate([0,0,w/2+screw_sink])
    cylinder(d=screw_cnt[d][0]+t,h=screw_sink+0.01,center=true,$fn=16);
  }else{ 
    translate([0,0,(w+screw_sink)/2])
    cylinder(d=screw_cyl[d][0]+t,h=screw_sink+0.01,center=true,$fn=16);
  }     
}

// screw cut
// material to be extracted from object to slide in a counter sunk screw for fixation
// w height of the cut out
// i depth of the screw
module screw_cut(d=M3,w=20,i=10,t=0,fn=32){
    hsh=screw_cnt[d][1];
    ws=screw_cnt[d][0]+t;
    ds=screw_d[d]+t;
    
    translate([i/2,0,-(w-hsh)/2])
      cube([i,ws,hsh],center=true);
    
    translate([0,0,-(w-hsh)/2])
      cylinder(d=ws,h=hsh,center=true,$fn=32);
    
    translate([0,0,-(w-hsh)/2+hsh])
        cylinder(d2=ds, d1=ws, h=hsh,center=true,$fn=fn);
    
    cylinder(h=w, d=ds, center=true, $fn=fn);   
    
    translate([i/2,0,0]) 
        cube([i,ds,w],center=true);
    
    for(y=[-1,1]){
        translate([i/2,y*ds/2,-w/2+hsh])
            rotate([45,0,0])
            cube([i,sqrt(2)*(ws-ds)/2,sqrt(2)*(ws-ds)/2],center=true);
    }
}
//screw_cut();

// nut cut
// material to be extracted from object to slide in a nut for fixation
// w height of the cylinder
// i lenght of the inlet
module nut_cut(w=10, wi=0, d=M3, i=10, t=0, rot=false,type=head_cyl){ 
  r=(rot)?90:0;
  ds=(rot)?screw_hex[d][1]:screw_hex[d][0];
  rotate([0,0,r])nut(d,t);
  translate([i/2,0,0])
    cube([i,ds+t,nuth(d)+t],center=true);
  translate([0,0,-wi])
      if(type==head_cnt){    
          screw(w=w, d=d, type=type, t=t); 
        translate([0,0,w/2])
          cylinder(d=screw_cnt[d][0]+t,h=raise,center=true,$fn=16);
      }
      else{ 
          screw(w=w, d=d, type=type, t=t);   
  //      translate([0,0,0])
          //#cylinder(d=screw_cyl[d][0]+t,h=w,center=true,$fn=16);
      }       
}

if(show_hex_bolt==true){
   hex_bolt(d=d, w=w, t=t);
}

if(show_nut==true){
  nut(d=d, t=t);
}    

if(show_screw==true){
   screw(w=w, d=d, type=type, t=t);
}

if(show_screw_fix==true){
  screw_fix(w=w, d=d, type=type, nut_sink=nut_sink, screw_sink=screw_sink, t=t);
}

if(show_screw_cut==true){
  screw_cut(d=d,w=w,i=i,t=t,$fn=fn);
}    

if(show_nut_cut==true){
  nut_cut(w=w, wi=wi, d=d, i=i, t=t,rot=rot,type=type);
}  
// file: ../library/linurs/linurs_screw_dim.scad
// Metric screws and nuts 
// urs@linurs.org

// contains dimensions of linurs_screw and can be included in other 
// OpenScad files 

// Parameters in this file
// d screw diameter M2_5, M3, ... (enumeration with screw_d)
// t millimeters added to diameters 

// enumerations of metric threads
M2_5=0;
M3=1;
M4=2;
M5=3;

// enumerations screw head type
head_cyl=0; // cylinder
head_cnt=1; // countrsunk
head_no=2;  // no head at all
head_hex=3;  // no head at all

// screw diameters
screw_d=[
2.5, // M2.5
3.0, // M3
4.0, // M4
5.0  // M5
];

// sizes for hex nuts
screw_hex=[
//   s,   e,   h
 [ 5.0, 5.8, 1.7], // M2.5
 [ 5.5, 6.4, 2.0], // M3
 [ 7.0, 8.1, 2.8], // M4
 [ 8.0, 9.2, 3.5]  // M5
];

// sizes for cylinder screw heads
screw_cyl=[
//   d,   h
 [ 4.5, 1.6], // M2.5
 [ 5.5, 2.0], // M3
 [ 7.0, 2.6], // M4
 [ 8.5, 3.3]  // M5
];

// sizes for countersunk screw heads
screw_cnt=[
//   d,   h
 [ 4.7, 1.50], // M2.5
 [ 5.6, 1.65], // M3
 [ 7.4, 2.20], // M4
 [ 9.2, 2.50]  // M5
];
// file: ../motherboard/motherboard_dim.scad
include <../library/linurs/linurs_screw_dim.scad>
include <../library/din41612/din41612_female_dim.scad>
include <../library/din41612/din41612_male_dim.scad>
include <../pcb/pcb_dim.scad>
// motherboard pcb dimensions
motherboard_l=pcb_l;   // pcb width
motherboard_h=1.6;     // pcb thickness
step=25.4;             // distance between modules

function motherboard_w(n)=din41612_female_w+step*(n-1);

screw_motherboard_d=M2_5;
screw_motherboard_l=16;
motherboard_pass=0.5;// gap to fit screws 

motherboard_z_offset=-din41612_male_w1-din41612_female_h1-motherboard_h;
// file: ../bracket/bracket_dim.scad
// bracket

include <../pcb/pcb_dim.scad>
include <../motherboard/motherboard_dim.scad>
include <../library/linurs/linurs_screw_dim.scad>

bracket_screw=M2_5;   // hole for the screw

bracket_gap=0.5;      // gap between bracket to make sure it fits in the box
bracket_screw_gap=0.5;// gap to fit the screw

bracket_l=pcb_w+15;   // height of bracket
bracket_l1=19;        // hole l
bracket_l2=3*screw_d[bracket_screw];
bracket_ld=pcb_wd;    // hole distance

bracket_h=10;         // depth of the U shape at the side of the screw
bracket_h1=4;         // depth of the U shape at the side where no screw is 
bracket_h2=2-bracket_gap/2;   // thickness of bracket
bracket_h3=5;         // hole h

bracket_w1=4;         // height of the mounting hole cube
bracket_tn=2;         // thickness of bracket
bracket_t=bracket_tn-bracket_gap/2;  // thickness of bracket - gap

bracket_offset_z=-10;  // bracket offset in elecbox z axis

function bracket_w(n)=step*n-bracket_gap;
function bracket_w2(n)=step*n-2*bracket_tn;
// file: ../pcb/pcb_dim.scad
// The pcb is the master object of the project
// therefore no other include files from other objects
// are necessary

// pcb constants
pcb_l =100;  // lenght of the pcb
pcb_ld = 94; // hole distance 
pcb_w=80;    // height of the pcb
pcb_wd = 67; // hole distance
pcb_wd1 = 9; // hole to edge distance 
pcb_d=3;     // diameter of holes
pcb_h=1.6;   // thickness
// main file
// AvrCtrl module
// ==============

AvrCtrl="assembly"; // [assembly,front,back,print_front,print_back]

include <../pcb/pcb_dim.scad>
include <../bracket/bracket_dim.scad>
include <../motherboard/motherboard_dim.scad>
include <../library/linurs/linurs_screw_dim.scad>

use <../library/linurs/linurs_screw.scad>
use <../bracket/bracket.scad>
use <../pcb/pcb.scad>

module AvrCtrl_back(){
    h1=12.5;
    w1=12;
    z1=14;
 
    h2=10;
    w2=39;
    z2=34.5;
    difference(){
        translate([0,0,bracket_offset_z])back_bracket(n=1);
        
        translate([
          0,
          h1/2+pcb_h,
          z1+w1/2])
        cube([
          bracket_h,
          h1,
          w1],center=true);
        
        translate([
          0,
          h2/2+pcb_h,
          z2+w2/2])
        cube([
          bracket_h,
          h2,
          w2],center=true);
        // bracket under cut for solder points of WAGO connector
        translate([  
          -9,
          -2,
          -12])
        cube([
          5,
          4,
          100]);
    }
}

module AvrCtrl_front(n=1){
    h1=14;
    w1=32;
    z1=12.5;
    
    h2=11.5;
    w2=13;
    z2=46.5;
    
    d3=4;
    h3=4.5;
    z3=67;
    
    d4=4.8;  //4.4 Loch 5 Ring
    h4=12;
    z4=63.5;
    
    d5=d4;
    h5=h4;
    z5=69.5;
    
    h6=9;
    
    difference(){
        translate([0,0,bracket_offset_z])front_bracket(n=1);
        translate([
          0,
          h1/2+pcb_h,
          z1+w1/2])
        cube([
          bracket_h,
          h1,
          w1],center=true); 
        
        translate([
          0,
          h2/2+pcb_h,
          z2+w2/2])
        cube([
          bracket_h,
          h2,
          w2],center=true);
        
        translate([
          -0.5,
          h6/2+pcb_h,
          z3])
        cube([
          4,
          h6,
          h6],center=true);    
        
        translate([
          0,
          h3+pcb_h,
          z3])rotate([0,90,0])
        cylinder(h=bracket_h,d=d3,center=true, $fn=16); 
        
        translate([
          0,
          h4+pcb_h,
          z4])rotate([0,90,0])
        cylinder(h=bracket_h,d=d4,center=true, $fn=16);   
        
        translate([
          0,
          h5+pcb_h,
          z5])rotate([0,90,0])
        cylinder(h=bracket_h,d=d5,center=true, $fn=16);   
    }
}

module AvrCtrl_assembly(){
    pcb_assembly();
    AvrCtrl_front();
    translate([pcb_l,0,0])AvrCtrl_back();
}

if(AvrCtrl=="assembly"){
  AvrCtrl_assembly();
}

if(AvrCtrl=="front"){
  AvrCtrl_front();
}

if(AvrCtrl=="back"){
  AvrCtrl_back();
}

if(AvrCtrl=="print_front"){
  rotate([0,-90,0])
    AvrCtrl_front();
}

if(AvrCtrl=="print_back"){
  rotate([0,90,0])AvrCtrl_back();
}
